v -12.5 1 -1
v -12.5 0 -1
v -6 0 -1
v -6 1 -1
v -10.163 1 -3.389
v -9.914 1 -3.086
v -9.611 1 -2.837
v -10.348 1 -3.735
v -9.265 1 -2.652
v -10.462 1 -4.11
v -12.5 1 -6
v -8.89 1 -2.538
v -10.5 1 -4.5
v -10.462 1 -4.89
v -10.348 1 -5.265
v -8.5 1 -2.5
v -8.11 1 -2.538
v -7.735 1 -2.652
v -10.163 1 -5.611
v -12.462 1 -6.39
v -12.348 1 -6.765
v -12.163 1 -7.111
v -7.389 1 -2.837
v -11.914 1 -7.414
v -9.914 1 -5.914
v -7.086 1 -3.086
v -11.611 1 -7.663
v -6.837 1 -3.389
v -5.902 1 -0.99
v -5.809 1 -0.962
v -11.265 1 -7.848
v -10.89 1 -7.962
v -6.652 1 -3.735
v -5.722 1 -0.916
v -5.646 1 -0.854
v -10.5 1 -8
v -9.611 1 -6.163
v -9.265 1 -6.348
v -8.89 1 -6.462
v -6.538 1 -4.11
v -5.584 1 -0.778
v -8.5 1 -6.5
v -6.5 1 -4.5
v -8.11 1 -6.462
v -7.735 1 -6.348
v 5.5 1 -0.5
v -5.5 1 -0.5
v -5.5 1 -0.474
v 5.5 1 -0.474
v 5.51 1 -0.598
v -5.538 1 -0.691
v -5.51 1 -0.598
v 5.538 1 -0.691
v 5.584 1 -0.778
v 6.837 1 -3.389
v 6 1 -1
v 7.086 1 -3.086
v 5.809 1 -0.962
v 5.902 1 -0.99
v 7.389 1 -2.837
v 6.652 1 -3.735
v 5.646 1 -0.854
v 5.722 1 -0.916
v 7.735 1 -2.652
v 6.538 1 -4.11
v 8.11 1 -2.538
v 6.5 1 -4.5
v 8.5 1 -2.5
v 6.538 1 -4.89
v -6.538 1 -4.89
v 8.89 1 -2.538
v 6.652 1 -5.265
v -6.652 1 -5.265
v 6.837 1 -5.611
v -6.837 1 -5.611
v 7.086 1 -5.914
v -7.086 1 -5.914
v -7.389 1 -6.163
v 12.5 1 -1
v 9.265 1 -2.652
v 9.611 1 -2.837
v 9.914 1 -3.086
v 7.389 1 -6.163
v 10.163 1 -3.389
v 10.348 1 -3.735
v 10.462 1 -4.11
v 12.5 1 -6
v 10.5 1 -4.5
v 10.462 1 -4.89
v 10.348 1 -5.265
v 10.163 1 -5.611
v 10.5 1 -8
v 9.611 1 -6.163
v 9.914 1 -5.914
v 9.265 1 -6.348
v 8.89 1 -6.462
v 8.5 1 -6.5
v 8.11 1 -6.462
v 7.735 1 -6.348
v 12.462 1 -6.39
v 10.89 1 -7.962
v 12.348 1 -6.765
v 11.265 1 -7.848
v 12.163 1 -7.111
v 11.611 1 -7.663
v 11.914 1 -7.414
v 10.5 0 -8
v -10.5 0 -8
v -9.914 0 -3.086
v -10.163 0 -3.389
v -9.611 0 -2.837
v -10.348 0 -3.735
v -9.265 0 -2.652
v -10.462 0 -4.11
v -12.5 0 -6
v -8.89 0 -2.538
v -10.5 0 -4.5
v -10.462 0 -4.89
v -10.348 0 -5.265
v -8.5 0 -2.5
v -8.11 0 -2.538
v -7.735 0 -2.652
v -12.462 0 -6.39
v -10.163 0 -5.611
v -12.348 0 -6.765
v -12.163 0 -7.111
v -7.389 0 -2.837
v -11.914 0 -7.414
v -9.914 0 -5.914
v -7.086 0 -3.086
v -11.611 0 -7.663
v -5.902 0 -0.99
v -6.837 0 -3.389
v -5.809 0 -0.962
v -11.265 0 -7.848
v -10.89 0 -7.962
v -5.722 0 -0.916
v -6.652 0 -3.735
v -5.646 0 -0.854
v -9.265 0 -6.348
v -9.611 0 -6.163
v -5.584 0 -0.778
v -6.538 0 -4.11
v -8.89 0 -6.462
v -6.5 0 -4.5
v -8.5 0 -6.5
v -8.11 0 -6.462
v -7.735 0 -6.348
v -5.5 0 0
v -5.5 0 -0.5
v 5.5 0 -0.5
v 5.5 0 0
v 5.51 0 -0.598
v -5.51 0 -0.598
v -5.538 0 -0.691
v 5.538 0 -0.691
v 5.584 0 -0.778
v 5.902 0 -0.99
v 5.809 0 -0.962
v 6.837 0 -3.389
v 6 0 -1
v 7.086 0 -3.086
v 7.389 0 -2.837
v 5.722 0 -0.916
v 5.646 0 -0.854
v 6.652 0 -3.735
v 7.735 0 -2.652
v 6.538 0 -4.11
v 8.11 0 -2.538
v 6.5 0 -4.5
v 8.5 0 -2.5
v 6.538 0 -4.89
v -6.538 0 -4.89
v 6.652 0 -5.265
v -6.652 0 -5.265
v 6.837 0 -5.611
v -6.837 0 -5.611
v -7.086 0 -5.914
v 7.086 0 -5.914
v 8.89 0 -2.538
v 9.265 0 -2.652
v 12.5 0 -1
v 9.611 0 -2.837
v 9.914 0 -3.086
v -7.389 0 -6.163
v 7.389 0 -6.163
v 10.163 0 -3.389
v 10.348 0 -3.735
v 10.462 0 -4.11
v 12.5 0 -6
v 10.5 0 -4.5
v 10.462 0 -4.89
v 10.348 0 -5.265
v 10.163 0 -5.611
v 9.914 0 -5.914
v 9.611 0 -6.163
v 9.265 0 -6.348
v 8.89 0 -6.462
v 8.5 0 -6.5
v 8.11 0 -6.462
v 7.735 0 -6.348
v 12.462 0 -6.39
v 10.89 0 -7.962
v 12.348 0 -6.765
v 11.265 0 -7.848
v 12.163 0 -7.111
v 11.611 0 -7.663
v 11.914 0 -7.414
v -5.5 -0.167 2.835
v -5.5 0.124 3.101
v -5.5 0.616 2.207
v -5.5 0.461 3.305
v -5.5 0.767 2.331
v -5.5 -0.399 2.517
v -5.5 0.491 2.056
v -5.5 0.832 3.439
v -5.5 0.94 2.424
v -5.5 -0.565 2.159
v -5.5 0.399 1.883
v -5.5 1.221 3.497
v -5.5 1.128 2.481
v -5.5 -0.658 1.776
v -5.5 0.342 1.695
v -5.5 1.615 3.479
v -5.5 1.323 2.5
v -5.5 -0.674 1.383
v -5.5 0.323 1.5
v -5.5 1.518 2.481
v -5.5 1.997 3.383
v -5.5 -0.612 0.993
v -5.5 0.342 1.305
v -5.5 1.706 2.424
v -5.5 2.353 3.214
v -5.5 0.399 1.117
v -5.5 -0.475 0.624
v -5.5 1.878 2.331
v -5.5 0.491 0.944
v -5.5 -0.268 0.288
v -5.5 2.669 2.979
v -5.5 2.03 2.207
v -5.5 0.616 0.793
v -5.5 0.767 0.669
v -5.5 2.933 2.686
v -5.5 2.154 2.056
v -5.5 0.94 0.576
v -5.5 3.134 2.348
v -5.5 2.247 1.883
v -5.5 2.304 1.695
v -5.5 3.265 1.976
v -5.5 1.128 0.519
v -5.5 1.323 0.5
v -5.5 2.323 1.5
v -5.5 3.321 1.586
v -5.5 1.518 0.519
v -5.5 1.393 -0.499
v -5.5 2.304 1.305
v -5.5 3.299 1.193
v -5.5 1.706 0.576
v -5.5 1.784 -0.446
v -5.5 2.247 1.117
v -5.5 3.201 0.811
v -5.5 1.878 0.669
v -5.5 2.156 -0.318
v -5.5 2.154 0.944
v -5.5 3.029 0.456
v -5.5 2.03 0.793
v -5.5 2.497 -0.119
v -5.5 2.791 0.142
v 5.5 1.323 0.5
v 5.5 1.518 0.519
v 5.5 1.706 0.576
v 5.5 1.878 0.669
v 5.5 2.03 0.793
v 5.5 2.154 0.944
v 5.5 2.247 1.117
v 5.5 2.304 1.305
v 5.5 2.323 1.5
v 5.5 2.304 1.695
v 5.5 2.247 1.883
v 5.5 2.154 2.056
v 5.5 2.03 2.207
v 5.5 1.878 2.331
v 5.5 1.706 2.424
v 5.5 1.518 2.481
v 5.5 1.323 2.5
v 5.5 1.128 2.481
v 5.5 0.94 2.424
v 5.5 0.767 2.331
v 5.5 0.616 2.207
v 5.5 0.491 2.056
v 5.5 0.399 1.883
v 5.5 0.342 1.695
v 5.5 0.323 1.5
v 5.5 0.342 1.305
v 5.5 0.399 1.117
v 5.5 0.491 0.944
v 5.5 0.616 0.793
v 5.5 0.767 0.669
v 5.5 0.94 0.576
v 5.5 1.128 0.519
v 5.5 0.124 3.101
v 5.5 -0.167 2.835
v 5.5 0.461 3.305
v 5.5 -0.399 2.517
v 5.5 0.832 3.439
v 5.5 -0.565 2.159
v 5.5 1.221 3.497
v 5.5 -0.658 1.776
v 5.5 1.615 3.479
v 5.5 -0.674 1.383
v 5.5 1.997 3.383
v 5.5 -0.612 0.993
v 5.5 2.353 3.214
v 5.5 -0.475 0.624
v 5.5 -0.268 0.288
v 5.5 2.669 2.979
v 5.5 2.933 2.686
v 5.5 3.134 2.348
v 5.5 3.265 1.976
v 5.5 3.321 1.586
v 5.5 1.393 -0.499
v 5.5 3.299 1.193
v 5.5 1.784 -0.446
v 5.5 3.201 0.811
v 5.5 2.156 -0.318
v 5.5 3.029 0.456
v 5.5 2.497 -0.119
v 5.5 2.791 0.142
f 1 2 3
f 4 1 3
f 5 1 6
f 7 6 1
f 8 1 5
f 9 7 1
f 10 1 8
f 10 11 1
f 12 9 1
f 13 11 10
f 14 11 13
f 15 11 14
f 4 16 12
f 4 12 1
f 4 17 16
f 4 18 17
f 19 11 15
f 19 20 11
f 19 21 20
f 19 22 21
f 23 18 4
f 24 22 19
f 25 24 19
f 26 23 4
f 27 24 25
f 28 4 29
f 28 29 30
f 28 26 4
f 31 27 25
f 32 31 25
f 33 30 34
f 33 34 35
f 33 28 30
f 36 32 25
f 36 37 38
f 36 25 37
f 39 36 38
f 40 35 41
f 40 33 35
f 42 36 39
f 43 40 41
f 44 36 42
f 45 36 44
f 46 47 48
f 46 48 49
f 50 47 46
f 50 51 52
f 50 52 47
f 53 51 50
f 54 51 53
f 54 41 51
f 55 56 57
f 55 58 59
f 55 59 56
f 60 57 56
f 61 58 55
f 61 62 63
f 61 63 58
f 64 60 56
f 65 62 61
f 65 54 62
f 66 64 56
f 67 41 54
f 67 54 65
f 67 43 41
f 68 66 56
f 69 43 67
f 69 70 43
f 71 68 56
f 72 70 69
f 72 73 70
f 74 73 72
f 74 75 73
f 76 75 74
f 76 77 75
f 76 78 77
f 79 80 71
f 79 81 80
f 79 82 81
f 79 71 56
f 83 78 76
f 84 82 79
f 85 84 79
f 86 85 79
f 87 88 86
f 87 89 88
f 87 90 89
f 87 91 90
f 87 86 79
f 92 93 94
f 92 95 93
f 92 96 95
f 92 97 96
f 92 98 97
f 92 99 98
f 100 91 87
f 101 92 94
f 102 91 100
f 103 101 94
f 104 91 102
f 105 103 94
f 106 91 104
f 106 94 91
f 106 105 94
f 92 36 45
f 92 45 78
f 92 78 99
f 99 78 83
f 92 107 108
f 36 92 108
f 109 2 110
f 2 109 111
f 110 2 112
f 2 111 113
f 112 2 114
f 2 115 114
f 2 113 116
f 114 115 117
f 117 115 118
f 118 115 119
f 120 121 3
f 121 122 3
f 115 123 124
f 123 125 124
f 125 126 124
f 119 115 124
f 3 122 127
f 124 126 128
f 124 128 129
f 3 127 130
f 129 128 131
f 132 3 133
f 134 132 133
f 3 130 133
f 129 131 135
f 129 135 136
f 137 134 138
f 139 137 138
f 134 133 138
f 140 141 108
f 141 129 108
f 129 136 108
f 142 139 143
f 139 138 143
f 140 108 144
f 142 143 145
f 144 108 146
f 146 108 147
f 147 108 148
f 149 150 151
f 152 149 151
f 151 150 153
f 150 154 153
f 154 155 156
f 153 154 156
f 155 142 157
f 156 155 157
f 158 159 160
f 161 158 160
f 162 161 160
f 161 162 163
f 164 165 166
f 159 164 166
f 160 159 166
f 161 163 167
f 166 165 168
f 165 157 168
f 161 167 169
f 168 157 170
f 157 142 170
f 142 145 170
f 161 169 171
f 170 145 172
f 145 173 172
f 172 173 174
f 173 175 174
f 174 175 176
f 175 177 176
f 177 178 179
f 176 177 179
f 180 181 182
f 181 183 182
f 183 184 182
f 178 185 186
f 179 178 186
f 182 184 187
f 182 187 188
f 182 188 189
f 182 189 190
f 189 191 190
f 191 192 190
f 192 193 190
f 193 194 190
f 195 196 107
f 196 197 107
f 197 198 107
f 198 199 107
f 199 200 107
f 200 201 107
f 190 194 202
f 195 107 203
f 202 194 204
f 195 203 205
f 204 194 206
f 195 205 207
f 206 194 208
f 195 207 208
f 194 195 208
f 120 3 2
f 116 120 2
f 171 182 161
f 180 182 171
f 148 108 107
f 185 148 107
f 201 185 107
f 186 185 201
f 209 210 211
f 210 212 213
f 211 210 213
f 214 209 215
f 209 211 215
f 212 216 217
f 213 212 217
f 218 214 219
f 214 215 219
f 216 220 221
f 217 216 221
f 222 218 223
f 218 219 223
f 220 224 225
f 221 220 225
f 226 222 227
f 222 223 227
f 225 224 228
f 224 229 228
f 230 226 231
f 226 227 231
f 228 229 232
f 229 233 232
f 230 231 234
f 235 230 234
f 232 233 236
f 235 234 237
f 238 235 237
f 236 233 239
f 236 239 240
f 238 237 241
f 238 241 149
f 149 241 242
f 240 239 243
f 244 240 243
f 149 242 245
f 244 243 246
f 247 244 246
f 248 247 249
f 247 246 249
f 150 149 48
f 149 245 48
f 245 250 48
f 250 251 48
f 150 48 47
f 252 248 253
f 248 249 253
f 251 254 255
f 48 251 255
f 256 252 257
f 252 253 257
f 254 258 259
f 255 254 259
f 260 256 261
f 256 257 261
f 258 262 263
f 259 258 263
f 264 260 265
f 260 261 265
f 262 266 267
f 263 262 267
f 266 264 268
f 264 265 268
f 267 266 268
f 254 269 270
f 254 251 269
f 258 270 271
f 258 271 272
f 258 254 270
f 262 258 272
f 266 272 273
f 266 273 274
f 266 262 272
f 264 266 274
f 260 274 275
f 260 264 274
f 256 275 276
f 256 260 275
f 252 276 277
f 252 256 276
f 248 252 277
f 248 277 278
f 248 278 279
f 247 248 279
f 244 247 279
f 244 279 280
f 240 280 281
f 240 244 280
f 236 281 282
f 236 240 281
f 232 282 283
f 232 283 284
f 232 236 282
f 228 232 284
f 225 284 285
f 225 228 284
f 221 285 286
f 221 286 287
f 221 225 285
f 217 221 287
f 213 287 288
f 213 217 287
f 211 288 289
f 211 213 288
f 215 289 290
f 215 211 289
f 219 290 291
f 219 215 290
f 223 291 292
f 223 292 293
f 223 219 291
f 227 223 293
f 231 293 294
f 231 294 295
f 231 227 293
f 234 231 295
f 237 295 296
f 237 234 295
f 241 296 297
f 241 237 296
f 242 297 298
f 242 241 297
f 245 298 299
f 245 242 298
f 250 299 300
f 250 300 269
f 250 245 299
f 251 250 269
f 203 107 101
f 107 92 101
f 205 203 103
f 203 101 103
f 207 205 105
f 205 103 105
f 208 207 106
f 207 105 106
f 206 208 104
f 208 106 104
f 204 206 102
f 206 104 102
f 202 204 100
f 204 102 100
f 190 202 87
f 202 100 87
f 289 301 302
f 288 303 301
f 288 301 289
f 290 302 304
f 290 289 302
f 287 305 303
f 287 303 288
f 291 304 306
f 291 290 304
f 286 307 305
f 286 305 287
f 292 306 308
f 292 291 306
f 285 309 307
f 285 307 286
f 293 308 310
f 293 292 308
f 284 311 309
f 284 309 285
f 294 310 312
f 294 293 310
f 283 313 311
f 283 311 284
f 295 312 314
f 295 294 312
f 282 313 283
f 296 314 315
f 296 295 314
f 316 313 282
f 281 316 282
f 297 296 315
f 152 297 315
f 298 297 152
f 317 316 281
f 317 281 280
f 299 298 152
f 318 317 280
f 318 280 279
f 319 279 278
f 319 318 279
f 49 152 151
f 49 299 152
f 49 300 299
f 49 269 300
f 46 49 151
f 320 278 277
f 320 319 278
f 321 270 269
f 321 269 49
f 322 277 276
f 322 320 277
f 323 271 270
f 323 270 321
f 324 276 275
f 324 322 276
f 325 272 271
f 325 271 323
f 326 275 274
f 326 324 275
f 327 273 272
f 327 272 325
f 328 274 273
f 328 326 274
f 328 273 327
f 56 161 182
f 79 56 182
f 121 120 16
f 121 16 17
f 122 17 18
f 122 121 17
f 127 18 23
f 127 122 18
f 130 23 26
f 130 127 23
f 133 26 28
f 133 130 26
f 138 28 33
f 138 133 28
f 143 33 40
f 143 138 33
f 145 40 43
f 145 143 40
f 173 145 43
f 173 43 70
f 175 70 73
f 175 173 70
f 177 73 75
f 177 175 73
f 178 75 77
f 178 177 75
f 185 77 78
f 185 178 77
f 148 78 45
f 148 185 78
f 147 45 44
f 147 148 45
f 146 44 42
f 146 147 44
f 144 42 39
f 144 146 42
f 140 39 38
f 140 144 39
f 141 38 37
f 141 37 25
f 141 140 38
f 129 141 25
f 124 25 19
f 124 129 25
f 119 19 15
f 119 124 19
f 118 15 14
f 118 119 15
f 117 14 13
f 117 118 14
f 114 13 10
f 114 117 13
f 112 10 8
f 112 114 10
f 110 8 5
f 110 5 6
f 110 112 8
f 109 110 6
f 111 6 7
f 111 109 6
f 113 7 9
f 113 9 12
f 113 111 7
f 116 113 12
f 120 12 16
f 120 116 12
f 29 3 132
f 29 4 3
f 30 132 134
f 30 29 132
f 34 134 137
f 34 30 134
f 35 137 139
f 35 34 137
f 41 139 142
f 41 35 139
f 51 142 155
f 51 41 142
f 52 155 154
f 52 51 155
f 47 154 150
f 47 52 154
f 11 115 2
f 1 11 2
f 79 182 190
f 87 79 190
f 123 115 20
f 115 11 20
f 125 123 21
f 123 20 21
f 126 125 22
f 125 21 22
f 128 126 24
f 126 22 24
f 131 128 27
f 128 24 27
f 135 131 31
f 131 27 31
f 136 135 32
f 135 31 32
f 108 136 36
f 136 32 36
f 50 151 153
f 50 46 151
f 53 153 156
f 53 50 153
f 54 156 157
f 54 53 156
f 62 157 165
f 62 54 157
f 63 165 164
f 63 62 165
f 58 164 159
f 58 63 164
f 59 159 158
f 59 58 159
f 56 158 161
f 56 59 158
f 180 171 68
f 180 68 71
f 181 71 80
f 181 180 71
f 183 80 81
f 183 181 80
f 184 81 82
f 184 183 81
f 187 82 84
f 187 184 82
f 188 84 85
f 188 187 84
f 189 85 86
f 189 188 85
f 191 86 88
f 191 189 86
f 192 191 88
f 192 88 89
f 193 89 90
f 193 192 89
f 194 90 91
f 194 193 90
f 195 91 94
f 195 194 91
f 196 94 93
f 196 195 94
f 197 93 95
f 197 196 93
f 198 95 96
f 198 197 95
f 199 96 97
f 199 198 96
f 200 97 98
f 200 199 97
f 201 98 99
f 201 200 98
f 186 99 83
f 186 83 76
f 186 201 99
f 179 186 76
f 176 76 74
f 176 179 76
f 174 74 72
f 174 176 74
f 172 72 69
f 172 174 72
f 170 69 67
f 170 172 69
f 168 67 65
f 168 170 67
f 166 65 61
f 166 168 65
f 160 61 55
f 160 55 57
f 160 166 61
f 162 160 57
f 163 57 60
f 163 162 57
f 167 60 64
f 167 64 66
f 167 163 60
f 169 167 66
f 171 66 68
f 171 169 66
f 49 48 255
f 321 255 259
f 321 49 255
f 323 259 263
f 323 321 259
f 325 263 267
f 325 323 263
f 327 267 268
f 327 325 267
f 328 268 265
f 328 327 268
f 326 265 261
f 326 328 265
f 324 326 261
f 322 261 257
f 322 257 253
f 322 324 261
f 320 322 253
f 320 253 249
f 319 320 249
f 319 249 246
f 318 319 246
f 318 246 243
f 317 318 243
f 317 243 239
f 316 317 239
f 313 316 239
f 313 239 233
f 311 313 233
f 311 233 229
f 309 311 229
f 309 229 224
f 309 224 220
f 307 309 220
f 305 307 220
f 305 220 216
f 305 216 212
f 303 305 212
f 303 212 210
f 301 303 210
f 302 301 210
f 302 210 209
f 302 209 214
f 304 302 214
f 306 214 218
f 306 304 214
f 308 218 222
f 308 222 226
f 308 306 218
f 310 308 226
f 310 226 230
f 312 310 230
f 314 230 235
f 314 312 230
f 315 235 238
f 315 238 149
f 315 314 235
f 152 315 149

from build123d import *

# Parameters (mm, degrees)
SKETCH_1_R      = 2
EXTRUDE_1_DEPTH = 1
FILLET_1_R      = 2
FILLET_2_R      = 0.5
SKETCH_3_R      = 2
SKETCH_3_R_2    = 1
EXTRUDE_2_DEPTH = 5.5


with BuildPart() as part:
    # 草图1 → 凸台-拉伸1 (new body)
    with BuildSketch(Plane(origin=(0, 0, 0), x_dir=(1, 0, 0), z_dir=(0, 1, 0))):
        Polygon((-12.5, 1), (-5.5, 1), (-5.5, 0), (5.5, 0), (5.5, 1), (12.5, 1), (12.5, 8), (-12.5, 8), align=None)
        with Locations(Location((8.5, 4.5, 0), (0, 0, 270))):
            Circle(SKETCH_1_R, mode=Mode.SUBTRACT)
        with Locations(Location((-8.5, 4.5, 0), (0, 0, 270))):
            Circle(SKETCH_1_R, mode=Mode.SUBTRACT)
    extrude(amount=EXTRUDE_1_DEPTH)

    # 圆角1
    fillet_1_edges = [part.edges().sort_by_distance(p)[0] for p in [
        (-12.5, 0.5, -8),
        (12.5, 0.5, -8),
    ]]
    fillet(fillet_1_edges, radius=FILLET_1_R)

    # 圆角2
    fillet_2_edges = [part.edges().sort_by_distance(p)[0] for p in [
        (5.5, 0.5, -1),
        (-5.5, 0.5, -1),
    ]]
    fillet(fillet_2_edges, radius=FILLET_2_R)

    # 草图3 → 凸台-拉伸2 (add, symmetric)
    with BuildSketch(Plane(origin=(0, 0, 0), x_dir=(0, 0, -1), z_dir=(1, 0, 0))):
        with Locations((-1.5, 1.322875656)):
            Circle(SKETCH_3_R)
        with Locations((-1.5, 1.322875656)):
            Circle(SKETCH_3_R_2, mode=Mode.SUBTRACT)
    extrude(amount=EXTRUDE_2_DEPTH, both=True)


solid = part.part
